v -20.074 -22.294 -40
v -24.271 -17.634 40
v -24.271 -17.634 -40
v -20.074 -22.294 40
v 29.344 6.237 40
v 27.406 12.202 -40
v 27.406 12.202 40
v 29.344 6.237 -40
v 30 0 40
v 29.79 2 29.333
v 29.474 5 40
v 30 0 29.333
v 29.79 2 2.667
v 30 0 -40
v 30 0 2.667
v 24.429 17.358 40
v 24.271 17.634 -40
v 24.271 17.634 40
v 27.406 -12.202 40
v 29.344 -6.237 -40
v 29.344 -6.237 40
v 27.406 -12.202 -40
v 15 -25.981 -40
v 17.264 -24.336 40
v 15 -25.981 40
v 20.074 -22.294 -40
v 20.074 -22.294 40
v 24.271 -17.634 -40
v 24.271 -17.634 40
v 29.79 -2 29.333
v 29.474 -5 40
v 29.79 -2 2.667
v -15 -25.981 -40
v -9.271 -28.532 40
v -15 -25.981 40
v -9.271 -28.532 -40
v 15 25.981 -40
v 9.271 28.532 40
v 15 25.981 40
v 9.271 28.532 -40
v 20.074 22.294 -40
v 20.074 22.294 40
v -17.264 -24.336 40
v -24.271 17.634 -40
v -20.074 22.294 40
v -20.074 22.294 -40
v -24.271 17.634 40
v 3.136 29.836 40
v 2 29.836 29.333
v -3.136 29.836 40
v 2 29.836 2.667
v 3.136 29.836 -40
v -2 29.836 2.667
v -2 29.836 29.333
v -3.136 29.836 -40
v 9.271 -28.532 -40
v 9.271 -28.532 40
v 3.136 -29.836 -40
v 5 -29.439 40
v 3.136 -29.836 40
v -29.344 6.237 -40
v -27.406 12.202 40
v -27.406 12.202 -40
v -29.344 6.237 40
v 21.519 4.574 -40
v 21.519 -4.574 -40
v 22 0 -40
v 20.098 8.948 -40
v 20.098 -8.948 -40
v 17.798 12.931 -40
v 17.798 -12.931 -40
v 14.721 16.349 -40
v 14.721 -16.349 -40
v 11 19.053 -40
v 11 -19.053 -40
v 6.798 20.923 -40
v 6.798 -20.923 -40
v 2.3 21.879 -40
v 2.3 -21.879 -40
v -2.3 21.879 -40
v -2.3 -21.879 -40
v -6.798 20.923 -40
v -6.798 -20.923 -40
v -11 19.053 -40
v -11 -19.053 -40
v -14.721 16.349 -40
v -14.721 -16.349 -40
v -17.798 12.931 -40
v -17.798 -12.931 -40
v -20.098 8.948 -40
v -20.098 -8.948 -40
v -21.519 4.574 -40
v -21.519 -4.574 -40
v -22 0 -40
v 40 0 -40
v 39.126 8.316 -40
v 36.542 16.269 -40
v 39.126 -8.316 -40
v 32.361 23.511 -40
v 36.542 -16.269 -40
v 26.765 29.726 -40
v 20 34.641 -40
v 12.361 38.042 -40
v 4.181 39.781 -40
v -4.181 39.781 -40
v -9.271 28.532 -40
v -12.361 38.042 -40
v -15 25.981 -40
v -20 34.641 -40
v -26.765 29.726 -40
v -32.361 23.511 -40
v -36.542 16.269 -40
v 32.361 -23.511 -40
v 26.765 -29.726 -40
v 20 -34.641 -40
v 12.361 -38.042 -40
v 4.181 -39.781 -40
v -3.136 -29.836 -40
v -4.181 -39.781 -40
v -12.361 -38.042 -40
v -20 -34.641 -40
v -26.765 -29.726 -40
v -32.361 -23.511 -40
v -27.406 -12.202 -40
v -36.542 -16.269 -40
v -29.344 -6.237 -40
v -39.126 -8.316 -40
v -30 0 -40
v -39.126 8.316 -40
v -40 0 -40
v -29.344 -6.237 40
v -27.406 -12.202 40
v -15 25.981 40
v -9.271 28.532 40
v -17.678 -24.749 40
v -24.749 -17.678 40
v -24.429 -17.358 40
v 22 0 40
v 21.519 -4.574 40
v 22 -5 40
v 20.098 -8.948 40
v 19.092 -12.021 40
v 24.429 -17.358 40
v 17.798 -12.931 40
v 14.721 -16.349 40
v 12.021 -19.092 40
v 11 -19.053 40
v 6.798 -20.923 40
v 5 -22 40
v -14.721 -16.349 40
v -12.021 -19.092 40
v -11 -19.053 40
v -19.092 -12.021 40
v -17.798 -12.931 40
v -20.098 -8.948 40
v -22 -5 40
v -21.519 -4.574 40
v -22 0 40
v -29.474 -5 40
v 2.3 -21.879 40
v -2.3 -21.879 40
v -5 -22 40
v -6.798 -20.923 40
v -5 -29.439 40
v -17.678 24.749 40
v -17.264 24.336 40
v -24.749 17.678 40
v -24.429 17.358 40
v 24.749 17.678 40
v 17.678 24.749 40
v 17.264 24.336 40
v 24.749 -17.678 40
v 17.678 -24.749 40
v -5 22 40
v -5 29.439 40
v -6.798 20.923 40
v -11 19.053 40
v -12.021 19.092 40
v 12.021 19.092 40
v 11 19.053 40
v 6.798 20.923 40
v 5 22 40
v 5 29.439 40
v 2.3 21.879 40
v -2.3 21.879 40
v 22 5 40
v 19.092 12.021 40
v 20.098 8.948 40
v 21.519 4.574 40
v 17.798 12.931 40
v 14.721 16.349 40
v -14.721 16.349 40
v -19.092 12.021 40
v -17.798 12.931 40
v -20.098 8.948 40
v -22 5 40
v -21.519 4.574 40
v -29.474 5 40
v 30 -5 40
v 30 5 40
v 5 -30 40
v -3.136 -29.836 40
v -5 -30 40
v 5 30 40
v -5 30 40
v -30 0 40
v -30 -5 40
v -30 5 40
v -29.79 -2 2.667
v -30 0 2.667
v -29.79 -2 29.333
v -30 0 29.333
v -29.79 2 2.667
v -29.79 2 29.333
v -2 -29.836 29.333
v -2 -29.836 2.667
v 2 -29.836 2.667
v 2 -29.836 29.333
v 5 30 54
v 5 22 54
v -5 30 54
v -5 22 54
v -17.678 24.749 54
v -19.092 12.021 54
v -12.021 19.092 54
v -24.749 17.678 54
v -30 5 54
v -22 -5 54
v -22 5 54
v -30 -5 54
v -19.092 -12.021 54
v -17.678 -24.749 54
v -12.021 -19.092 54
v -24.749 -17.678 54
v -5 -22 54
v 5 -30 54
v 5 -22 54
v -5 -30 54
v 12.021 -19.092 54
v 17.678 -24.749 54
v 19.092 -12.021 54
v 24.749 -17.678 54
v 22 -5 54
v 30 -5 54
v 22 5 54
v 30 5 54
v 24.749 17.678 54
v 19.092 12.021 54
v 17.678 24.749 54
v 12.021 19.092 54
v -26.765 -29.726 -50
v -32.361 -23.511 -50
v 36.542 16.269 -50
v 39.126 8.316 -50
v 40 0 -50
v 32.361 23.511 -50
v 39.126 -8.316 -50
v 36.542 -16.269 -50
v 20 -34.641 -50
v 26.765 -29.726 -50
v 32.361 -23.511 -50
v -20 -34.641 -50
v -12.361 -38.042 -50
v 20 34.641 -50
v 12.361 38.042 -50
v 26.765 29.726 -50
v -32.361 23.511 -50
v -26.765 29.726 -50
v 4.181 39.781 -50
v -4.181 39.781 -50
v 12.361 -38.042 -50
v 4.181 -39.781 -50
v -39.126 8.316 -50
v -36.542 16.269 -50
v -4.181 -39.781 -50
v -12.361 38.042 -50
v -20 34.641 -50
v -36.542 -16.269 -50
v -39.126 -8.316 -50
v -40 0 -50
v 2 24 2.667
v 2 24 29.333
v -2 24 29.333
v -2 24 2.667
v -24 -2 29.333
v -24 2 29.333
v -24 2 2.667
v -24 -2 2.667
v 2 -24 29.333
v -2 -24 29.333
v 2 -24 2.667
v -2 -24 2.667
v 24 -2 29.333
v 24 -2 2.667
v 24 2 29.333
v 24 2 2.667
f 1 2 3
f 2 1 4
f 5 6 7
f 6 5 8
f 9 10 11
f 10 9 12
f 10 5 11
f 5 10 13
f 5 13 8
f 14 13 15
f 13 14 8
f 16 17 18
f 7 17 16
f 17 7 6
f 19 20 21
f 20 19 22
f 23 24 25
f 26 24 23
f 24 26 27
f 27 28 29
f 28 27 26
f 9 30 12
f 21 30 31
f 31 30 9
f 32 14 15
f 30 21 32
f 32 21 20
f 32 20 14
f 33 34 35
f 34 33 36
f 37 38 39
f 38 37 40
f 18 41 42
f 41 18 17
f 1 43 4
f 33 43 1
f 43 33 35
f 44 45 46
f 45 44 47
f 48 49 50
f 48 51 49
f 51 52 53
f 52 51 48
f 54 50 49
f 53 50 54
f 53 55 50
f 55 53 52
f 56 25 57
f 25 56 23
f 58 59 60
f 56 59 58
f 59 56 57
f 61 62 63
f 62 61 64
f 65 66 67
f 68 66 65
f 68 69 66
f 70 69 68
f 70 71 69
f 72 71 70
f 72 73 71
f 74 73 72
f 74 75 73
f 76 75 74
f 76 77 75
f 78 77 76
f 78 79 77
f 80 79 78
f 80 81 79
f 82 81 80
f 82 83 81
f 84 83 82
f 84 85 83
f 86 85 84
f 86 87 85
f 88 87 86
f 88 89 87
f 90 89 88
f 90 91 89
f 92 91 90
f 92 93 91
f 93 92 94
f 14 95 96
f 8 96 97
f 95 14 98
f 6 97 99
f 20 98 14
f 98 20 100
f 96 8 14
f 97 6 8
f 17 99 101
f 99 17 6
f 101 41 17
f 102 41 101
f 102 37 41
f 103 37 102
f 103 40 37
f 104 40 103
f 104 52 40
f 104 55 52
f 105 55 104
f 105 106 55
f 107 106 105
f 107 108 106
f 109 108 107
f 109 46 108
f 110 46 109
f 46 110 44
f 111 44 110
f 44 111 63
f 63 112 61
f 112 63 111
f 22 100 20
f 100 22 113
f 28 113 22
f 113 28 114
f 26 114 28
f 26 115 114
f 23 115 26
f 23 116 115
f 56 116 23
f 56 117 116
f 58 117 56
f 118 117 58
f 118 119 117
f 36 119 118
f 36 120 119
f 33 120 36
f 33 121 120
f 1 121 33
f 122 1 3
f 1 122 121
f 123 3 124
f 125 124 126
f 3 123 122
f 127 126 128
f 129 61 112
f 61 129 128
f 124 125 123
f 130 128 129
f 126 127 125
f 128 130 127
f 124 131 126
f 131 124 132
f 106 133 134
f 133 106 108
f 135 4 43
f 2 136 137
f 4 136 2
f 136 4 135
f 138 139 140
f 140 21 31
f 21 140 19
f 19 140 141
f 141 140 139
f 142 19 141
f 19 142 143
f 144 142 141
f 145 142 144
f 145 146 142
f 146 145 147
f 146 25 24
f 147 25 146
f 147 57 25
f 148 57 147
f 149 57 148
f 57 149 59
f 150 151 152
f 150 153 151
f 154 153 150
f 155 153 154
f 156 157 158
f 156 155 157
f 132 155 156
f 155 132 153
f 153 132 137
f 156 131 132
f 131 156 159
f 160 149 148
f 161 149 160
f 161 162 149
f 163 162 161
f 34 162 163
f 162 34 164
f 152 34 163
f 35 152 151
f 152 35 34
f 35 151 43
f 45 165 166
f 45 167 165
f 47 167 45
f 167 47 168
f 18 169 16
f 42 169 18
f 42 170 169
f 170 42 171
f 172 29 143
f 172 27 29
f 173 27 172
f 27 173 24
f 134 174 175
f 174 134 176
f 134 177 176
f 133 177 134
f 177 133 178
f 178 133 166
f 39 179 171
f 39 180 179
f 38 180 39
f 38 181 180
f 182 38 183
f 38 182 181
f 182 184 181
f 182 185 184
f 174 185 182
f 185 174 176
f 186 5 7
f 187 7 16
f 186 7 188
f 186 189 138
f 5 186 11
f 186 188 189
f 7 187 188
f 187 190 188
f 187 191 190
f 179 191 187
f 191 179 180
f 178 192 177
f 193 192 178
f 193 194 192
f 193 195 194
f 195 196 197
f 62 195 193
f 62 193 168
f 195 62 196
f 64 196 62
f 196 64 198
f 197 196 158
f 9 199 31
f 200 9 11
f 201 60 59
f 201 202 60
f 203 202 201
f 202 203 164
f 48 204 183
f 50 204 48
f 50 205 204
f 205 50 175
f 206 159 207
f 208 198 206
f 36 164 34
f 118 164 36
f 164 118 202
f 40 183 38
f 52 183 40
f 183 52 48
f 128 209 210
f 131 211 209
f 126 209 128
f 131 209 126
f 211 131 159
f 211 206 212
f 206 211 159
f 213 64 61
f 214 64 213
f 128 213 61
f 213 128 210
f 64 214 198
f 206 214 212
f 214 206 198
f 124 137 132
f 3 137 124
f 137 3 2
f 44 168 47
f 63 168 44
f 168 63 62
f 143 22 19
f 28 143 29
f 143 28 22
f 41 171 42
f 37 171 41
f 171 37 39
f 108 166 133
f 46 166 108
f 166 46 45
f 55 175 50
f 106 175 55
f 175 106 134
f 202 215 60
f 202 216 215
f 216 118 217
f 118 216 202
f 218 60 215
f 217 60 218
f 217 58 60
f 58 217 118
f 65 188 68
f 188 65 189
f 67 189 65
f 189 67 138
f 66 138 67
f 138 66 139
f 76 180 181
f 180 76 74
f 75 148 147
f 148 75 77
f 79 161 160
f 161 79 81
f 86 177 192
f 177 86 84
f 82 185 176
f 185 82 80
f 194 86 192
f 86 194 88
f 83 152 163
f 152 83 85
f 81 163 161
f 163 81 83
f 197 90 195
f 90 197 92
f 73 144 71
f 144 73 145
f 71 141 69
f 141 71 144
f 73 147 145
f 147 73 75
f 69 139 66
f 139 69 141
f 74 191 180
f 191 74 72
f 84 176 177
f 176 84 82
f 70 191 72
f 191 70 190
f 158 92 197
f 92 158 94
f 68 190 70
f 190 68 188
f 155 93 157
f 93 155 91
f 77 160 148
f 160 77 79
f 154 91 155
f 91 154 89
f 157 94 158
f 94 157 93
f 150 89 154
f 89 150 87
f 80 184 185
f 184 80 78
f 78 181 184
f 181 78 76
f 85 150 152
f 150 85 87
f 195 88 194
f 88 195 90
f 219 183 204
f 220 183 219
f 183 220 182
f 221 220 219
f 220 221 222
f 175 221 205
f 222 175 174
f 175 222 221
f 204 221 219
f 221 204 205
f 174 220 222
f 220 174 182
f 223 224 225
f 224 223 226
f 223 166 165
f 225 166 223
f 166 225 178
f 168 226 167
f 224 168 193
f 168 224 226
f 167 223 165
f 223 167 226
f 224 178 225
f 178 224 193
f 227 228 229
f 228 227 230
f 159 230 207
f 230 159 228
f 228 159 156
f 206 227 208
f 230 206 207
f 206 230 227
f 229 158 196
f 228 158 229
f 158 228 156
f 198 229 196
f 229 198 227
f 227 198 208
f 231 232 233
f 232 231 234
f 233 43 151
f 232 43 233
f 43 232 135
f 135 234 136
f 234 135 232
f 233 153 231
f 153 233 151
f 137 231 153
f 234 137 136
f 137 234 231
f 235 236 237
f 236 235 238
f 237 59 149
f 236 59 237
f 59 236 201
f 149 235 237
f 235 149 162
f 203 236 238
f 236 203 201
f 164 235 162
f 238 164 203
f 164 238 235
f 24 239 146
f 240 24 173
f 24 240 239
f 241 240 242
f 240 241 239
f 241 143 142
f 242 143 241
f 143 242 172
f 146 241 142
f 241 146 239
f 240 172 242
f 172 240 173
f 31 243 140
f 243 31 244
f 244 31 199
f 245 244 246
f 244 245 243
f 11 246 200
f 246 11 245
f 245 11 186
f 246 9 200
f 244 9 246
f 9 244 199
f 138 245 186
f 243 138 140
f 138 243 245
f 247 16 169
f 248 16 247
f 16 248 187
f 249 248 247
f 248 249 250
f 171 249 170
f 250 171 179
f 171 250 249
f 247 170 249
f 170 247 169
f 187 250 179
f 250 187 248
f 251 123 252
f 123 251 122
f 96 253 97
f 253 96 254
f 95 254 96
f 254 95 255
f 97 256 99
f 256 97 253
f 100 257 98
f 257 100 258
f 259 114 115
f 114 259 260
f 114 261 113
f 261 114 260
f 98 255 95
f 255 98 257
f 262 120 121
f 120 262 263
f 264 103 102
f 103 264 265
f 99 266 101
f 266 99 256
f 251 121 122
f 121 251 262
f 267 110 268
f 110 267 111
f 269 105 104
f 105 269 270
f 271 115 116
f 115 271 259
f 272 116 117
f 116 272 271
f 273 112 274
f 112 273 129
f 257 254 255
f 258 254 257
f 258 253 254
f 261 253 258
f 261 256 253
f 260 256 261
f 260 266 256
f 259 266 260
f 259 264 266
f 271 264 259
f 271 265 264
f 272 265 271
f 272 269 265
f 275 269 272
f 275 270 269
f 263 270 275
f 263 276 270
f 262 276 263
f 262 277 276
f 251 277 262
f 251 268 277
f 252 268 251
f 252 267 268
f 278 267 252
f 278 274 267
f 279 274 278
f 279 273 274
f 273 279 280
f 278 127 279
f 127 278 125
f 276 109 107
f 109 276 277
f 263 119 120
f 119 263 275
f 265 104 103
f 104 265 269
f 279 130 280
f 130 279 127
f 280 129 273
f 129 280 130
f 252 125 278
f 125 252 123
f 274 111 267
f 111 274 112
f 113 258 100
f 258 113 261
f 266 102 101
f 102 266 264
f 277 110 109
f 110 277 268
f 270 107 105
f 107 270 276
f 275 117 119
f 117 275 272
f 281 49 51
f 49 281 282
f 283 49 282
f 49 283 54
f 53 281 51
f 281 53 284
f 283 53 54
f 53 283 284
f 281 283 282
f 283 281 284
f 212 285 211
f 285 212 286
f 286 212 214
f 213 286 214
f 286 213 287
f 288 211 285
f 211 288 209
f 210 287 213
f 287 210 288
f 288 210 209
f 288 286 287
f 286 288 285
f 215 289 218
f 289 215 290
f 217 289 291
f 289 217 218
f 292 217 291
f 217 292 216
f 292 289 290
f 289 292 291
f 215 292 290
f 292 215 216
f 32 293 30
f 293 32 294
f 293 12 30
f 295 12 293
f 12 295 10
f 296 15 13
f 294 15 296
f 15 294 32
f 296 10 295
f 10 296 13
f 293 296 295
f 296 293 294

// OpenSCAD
// 3DScad sample: medieval castle tower
// Uses only the currently round-trippable subset.

module scene_model() {
    tower_r = 30;
    tower_h = 80;
    wall_t = 8;
    battlement_count = 8;
    battlement_w = 10;
    battlement_h = 14;
    slit_count = 4;

    difference() {
        union() {
            difference() {
                cylinder(h=tower_h, r=tower_r, center=true);
                cylinder(h=tower_h + 2, r=tower_r - wall_t, center=true);
            }
            translate([0, 0, -tower_h / 2 - 5]) {
                cylinder(h=10, r=tower_r + 10, center=true);
            }
            for (i = [0 : 1 : battlement_count - 1]) {
                rotate([0, 0, i * 360 / battlement_count]) {
                    translate([0, tower_r - wall_t / 2, tower_h / 2 + battlement_h / 2]) {
                        cube([battlement_w, wall_t, battlement_h], center=true);
                    }
                }
            }
        }
        for (i = [0 : 1 : slit_count - 1]) {
            rotate([0, 0, i * 360 / slit_count]) {
                translate([0, tower_r, tower_h / 5]) {
                    cube([4, wall_t + 4, tower_h / 3], center=true);
                }
            }
        }
    }
}

scene_model();
